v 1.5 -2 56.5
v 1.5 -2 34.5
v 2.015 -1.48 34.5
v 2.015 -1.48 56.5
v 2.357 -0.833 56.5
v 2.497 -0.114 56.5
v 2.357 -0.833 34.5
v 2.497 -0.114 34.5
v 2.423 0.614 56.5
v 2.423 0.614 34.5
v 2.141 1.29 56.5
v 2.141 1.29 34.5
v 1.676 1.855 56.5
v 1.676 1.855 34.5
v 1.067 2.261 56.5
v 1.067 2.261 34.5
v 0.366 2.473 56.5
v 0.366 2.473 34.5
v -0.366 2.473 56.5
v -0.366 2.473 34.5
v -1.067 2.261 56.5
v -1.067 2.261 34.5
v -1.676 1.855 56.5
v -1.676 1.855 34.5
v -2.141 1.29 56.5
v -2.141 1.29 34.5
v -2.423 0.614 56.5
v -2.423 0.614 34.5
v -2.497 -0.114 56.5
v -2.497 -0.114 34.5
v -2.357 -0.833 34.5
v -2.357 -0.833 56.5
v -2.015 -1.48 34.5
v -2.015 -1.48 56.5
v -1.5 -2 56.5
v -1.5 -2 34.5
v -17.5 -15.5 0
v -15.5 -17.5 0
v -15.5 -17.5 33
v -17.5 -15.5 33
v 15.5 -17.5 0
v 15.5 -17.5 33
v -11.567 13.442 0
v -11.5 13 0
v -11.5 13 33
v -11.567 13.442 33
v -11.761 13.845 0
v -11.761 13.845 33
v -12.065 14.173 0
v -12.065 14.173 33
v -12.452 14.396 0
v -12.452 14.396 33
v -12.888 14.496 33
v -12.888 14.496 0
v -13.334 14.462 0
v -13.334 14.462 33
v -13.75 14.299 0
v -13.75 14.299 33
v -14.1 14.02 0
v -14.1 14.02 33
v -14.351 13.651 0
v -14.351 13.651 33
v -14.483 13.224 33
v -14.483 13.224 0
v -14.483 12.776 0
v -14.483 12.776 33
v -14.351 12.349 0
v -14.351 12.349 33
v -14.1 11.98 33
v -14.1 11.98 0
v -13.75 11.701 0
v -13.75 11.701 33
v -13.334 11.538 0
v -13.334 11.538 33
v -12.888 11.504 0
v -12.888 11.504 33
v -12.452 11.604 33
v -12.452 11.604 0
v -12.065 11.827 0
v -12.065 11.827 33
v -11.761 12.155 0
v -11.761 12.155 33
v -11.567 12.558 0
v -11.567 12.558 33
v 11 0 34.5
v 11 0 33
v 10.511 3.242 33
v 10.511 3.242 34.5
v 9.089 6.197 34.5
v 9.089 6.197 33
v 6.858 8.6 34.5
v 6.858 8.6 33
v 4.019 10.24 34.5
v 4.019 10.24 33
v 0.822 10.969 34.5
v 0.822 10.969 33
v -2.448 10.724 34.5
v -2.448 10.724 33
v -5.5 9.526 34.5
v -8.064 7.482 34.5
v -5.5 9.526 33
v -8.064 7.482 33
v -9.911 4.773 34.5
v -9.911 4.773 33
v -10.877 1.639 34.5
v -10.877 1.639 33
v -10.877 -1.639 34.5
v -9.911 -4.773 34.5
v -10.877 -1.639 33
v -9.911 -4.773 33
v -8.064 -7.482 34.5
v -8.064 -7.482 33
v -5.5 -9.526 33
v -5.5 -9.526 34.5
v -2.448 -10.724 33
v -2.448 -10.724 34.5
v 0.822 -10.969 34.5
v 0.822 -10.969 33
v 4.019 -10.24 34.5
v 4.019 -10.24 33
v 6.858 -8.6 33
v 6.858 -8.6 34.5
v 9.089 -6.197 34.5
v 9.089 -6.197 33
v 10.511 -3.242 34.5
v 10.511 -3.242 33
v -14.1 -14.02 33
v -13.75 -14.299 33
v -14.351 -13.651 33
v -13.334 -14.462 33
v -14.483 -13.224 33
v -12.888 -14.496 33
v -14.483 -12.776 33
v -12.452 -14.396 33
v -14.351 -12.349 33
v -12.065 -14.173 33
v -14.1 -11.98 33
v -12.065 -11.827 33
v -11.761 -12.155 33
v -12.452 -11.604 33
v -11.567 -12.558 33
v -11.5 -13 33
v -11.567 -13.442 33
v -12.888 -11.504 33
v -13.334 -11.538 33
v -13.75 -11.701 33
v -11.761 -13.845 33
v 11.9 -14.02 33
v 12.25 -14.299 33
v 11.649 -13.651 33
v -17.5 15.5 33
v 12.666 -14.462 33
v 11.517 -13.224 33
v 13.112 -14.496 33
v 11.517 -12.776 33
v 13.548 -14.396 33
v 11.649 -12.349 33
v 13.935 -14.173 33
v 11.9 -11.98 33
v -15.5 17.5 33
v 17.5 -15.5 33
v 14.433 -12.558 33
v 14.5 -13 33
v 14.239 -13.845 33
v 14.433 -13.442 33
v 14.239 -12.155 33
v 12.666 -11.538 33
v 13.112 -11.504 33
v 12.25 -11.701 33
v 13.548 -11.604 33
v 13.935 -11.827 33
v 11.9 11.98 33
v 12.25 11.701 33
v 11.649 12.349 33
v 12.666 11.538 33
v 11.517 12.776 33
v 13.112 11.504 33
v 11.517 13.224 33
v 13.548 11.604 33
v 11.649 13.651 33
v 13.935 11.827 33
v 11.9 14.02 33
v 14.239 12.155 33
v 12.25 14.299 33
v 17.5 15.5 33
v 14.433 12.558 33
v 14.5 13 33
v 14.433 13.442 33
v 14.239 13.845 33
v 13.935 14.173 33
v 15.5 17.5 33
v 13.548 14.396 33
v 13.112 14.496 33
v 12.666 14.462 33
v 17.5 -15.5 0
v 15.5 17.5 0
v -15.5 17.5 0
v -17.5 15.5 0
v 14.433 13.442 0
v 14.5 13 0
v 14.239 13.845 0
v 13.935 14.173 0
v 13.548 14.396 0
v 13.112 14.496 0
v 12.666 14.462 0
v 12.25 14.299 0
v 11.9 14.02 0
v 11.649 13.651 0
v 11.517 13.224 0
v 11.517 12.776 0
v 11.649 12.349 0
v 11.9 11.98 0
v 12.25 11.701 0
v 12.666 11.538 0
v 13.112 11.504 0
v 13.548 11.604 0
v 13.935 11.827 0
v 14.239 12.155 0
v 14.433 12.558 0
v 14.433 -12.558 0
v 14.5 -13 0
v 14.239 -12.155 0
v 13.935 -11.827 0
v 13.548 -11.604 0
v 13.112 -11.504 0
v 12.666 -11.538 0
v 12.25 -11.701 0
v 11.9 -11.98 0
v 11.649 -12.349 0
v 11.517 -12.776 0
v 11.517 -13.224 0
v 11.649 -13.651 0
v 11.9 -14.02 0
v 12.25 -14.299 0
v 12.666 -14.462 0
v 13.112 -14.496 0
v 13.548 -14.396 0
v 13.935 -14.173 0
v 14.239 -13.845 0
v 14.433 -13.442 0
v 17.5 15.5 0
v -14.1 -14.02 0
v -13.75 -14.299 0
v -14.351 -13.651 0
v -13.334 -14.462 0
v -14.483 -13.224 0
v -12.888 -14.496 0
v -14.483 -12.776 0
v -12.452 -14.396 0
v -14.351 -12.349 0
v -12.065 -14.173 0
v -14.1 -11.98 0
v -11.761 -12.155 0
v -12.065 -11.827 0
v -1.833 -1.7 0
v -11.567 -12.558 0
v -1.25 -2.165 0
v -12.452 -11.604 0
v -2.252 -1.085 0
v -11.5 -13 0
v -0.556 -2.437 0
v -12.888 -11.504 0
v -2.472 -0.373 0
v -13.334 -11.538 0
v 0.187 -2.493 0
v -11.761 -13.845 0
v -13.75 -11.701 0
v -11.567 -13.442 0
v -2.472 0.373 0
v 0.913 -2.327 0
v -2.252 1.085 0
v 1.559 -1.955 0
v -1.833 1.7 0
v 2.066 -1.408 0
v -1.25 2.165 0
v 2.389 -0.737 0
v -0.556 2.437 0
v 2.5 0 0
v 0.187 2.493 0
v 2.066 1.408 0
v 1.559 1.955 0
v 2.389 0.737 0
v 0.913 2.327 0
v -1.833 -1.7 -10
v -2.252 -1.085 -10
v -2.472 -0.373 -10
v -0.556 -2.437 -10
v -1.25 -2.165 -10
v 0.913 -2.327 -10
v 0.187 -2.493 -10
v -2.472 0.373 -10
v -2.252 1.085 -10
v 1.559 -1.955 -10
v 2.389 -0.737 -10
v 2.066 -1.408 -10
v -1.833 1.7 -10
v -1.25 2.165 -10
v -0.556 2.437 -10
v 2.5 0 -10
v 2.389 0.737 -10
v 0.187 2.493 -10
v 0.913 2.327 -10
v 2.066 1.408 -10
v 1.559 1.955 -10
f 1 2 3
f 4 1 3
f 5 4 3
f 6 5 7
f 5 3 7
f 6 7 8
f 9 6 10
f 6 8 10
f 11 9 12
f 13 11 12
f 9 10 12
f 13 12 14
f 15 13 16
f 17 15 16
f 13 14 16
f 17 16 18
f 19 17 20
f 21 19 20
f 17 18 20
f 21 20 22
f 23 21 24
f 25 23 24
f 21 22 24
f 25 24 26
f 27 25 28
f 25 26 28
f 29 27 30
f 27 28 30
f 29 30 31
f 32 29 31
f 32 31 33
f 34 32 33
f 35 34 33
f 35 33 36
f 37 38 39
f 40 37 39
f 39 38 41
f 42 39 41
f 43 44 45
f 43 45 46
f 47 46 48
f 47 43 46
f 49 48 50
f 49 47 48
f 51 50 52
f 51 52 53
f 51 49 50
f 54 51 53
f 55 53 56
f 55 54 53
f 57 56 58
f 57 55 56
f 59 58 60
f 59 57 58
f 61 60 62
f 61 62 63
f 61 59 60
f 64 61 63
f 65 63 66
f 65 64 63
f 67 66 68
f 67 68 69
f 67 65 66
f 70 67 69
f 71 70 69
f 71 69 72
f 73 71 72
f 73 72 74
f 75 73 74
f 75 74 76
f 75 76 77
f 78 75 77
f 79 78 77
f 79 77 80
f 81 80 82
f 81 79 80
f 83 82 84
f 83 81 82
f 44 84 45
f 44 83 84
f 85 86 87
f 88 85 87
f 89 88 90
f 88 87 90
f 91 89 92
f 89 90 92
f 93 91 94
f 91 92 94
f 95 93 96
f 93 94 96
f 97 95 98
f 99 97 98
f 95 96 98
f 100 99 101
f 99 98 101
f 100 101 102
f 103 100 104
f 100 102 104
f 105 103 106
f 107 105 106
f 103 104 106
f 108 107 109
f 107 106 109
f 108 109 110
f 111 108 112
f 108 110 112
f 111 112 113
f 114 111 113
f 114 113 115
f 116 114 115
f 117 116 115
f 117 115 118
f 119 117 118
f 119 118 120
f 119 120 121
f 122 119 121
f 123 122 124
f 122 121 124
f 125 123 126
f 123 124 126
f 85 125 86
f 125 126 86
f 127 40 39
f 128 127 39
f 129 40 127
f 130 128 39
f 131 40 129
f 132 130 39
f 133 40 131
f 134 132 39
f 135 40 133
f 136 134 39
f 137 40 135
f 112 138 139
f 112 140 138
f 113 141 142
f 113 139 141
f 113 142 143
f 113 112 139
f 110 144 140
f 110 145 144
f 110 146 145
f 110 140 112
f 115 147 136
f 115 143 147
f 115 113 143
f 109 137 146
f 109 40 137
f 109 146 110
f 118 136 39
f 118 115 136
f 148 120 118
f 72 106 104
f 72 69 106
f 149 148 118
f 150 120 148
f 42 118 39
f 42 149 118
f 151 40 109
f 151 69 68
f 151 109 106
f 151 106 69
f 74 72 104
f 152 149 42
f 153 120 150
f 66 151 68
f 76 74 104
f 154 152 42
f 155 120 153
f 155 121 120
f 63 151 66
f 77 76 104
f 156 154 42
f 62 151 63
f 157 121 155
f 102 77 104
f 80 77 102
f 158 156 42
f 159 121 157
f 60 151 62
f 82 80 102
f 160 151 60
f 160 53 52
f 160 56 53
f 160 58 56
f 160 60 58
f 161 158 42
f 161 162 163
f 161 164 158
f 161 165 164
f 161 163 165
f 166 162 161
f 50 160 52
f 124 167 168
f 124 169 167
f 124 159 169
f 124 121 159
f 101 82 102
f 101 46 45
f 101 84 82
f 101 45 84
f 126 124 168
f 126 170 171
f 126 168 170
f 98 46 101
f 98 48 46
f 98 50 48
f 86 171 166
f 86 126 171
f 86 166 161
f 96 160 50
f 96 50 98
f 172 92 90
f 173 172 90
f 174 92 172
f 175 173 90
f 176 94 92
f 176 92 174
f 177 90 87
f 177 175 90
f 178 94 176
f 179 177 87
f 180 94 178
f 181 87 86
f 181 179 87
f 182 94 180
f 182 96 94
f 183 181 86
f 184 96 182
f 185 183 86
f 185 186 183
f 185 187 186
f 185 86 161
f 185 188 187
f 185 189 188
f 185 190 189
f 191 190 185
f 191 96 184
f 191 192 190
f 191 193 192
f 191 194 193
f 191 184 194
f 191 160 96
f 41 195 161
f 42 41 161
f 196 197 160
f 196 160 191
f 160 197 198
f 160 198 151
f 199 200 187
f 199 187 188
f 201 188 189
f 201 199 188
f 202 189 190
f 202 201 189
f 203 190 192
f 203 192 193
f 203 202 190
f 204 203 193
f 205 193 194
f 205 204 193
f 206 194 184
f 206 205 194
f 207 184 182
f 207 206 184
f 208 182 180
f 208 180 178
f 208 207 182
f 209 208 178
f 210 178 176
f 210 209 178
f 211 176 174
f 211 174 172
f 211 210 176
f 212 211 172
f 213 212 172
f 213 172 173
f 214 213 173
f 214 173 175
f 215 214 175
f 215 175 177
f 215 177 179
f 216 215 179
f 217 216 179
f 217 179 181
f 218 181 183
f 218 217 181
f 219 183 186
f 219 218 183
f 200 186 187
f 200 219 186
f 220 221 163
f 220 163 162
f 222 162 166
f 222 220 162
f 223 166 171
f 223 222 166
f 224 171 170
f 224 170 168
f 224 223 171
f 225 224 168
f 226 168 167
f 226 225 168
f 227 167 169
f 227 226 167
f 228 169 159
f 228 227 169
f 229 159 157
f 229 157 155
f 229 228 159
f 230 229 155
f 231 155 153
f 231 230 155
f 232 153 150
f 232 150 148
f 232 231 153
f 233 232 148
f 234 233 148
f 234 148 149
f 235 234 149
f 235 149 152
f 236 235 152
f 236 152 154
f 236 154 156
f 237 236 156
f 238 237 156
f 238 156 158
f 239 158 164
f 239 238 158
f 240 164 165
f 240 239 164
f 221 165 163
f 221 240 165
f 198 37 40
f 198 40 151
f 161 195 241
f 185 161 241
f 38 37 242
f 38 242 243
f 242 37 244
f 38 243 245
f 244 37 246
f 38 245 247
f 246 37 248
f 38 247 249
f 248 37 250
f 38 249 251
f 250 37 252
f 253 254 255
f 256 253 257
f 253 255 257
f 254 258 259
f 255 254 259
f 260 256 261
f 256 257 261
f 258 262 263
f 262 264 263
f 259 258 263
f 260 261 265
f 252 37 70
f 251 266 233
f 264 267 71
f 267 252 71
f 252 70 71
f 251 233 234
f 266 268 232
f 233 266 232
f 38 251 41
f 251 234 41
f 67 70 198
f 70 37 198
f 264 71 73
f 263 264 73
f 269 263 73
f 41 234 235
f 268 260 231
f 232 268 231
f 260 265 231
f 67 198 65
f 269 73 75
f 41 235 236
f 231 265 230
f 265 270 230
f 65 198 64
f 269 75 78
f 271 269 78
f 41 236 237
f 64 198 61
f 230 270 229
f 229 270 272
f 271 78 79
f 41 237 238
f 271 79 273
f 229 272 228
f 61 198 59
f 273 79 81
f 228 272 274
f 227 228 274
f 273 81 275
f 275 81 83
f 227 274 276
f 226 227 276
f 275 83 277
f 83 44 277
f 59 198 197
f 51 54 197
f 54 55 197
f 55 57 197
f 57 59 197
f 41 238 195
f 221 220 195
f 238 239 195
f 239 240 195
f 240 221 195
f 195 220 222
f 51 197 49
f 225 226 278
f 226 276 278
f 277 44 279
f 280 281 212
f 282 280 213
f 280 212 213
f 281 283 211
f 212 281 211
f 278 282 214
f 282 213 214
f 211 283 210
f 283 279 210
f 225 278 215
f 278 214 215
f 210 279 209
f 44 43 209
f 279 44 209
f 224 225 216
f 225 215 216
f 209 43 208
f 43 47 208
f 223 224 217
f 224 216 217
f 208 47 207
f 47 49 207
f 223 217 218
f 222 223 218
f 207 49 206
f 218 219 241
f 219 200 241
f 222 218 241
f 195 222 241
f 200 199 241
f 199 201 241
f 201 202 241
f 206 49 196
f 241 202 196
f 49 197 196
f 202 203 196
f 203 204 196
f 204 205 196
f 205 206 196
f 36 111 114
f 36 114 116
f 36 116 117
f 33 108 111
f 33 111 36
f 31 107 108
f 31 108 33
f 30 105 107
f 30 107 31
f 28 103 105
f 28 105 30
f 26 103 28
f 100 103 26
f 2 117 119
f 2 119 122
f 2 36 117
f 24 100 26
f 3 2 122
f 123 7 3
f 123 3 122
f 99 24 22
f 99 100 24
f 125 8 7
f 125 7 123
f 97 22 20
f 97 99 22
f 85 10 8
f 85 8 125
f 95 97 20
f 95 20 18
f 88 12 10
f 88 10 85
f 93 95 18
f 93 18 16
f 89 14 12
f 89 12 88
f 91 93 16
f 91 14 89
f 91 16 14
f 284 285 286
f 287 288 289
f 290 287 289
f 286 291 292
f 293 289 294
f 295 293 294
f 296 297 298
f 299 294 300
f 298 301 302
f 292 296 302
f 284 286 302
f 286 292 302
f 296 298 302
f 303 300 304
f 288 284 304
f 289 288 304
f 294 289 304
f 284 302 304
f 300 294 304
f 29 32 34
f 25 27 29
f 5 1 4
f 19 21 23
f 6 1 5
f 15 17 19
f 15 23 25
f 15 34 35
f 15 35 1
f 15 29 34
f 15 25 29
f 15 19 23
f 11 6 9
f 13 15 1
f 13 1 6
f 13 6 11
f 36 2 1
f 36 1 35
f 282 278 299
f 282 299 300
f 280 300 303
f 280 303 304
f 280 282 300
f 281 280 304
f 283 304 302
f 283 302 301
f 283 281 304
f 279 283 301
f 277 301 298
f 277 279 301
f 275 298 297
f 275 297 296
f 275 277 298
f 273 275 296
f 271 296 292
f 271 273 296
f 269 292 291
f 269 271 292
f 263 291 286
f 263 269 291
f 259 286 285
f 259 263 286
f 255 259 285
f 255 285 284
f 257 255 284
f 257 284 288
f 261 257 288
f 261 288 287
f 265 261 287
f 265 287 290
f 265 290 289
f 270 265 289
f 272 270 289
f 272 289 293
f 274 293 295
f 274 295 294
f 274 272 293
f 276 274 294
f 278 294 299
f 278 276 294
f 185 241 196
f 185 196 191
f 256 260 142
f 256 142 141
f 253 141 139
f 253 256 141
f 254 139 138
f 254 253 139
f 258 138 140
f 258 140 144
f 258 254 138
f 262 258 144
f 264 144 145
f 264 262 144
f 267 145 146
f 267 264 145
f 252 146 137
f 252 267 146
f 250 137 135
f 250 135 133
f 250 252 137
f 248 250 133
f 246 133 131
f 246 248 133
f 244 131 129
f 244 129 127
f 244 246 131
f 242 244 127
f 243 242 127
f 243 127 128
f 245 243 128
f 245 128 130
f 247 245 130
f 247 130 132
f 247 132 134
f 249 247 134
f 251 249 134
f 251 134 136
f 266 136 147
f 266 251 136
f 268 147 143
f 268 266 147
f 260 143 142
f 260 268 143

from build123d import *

# Parameters (mm, degrees)
SKETCH003_R  = 2.5
PAD_DEPTH    = 10
SKETCH002_W  = 35
SKETCH002_H  = 35
SKETCH002_R  = 1.5
PAD001_DEPTH = 33
SKETCH004_R  = 11
PAD002_DEPTH = 1.5
PAD003_DEPTH = 22
CHAMFER_SIZE = 2


with BuildPart() as part:
    # Sketch003 → Pad (new body)
    with BuildSketch(Plane.XY):
        Circle(SKETCH003_R)
    extrude(amount=-PAD_DEPTH)

    # Sketch002 → Pad001 (new body)
    with BuildSketch(Plane.XY):
        Rectangle(SKETCH002_W, SKETCH002_H)
        with Locations((-13, 13)):
            Circle(SKETCH002_R, mode=Mode.SUBTRACT)
        with Locations((13, 13)):
            Circle(SKETCH002_R, mode=Mode.SUBTRACT)
        with Locations((13, -13)):
            Circle(SKETCH002_R, mode=Mode.SUBTRACT)
        with Locations((-13, -13)):
            Circle(SKETCH002_R, mode=Mode.SUBTRACT)
    extrude(amount=PAD001_DEPTH)

    # Sketch004 → Pad002 (new body)
    with BuildSketch(Plane.XY.offset(33)):
        Circle(SKETCH004_R)
    extrude(amount=PAD002_DEPTH)

    # Sketch005 → Pad003 (new body)
    with BuildSketch(Plane.XY.offset(34.5)):
        with BuildLine():
            ThreePointArc((1.5, -2), (0, 2.5), (-1.5, -2))
            Line((1.5, -2), (-1.5, -2))
        make_face()
    extrude(amount=PAD003_DEPTH)

    # Chamfer
    chamfer_edges = [part.edges().sort_by_distance(p)[0] for p in [
        (-17.5, -17.5, 16.5),
        (-17.5, 17.5, 16.5),
        (17.5, -17.5, 16.5),
        (17.5, 17.5, 16.5),
    ]]
    chamfer(chamfer_edges, length=CHAMFER_SIZE)


solid = part.part
